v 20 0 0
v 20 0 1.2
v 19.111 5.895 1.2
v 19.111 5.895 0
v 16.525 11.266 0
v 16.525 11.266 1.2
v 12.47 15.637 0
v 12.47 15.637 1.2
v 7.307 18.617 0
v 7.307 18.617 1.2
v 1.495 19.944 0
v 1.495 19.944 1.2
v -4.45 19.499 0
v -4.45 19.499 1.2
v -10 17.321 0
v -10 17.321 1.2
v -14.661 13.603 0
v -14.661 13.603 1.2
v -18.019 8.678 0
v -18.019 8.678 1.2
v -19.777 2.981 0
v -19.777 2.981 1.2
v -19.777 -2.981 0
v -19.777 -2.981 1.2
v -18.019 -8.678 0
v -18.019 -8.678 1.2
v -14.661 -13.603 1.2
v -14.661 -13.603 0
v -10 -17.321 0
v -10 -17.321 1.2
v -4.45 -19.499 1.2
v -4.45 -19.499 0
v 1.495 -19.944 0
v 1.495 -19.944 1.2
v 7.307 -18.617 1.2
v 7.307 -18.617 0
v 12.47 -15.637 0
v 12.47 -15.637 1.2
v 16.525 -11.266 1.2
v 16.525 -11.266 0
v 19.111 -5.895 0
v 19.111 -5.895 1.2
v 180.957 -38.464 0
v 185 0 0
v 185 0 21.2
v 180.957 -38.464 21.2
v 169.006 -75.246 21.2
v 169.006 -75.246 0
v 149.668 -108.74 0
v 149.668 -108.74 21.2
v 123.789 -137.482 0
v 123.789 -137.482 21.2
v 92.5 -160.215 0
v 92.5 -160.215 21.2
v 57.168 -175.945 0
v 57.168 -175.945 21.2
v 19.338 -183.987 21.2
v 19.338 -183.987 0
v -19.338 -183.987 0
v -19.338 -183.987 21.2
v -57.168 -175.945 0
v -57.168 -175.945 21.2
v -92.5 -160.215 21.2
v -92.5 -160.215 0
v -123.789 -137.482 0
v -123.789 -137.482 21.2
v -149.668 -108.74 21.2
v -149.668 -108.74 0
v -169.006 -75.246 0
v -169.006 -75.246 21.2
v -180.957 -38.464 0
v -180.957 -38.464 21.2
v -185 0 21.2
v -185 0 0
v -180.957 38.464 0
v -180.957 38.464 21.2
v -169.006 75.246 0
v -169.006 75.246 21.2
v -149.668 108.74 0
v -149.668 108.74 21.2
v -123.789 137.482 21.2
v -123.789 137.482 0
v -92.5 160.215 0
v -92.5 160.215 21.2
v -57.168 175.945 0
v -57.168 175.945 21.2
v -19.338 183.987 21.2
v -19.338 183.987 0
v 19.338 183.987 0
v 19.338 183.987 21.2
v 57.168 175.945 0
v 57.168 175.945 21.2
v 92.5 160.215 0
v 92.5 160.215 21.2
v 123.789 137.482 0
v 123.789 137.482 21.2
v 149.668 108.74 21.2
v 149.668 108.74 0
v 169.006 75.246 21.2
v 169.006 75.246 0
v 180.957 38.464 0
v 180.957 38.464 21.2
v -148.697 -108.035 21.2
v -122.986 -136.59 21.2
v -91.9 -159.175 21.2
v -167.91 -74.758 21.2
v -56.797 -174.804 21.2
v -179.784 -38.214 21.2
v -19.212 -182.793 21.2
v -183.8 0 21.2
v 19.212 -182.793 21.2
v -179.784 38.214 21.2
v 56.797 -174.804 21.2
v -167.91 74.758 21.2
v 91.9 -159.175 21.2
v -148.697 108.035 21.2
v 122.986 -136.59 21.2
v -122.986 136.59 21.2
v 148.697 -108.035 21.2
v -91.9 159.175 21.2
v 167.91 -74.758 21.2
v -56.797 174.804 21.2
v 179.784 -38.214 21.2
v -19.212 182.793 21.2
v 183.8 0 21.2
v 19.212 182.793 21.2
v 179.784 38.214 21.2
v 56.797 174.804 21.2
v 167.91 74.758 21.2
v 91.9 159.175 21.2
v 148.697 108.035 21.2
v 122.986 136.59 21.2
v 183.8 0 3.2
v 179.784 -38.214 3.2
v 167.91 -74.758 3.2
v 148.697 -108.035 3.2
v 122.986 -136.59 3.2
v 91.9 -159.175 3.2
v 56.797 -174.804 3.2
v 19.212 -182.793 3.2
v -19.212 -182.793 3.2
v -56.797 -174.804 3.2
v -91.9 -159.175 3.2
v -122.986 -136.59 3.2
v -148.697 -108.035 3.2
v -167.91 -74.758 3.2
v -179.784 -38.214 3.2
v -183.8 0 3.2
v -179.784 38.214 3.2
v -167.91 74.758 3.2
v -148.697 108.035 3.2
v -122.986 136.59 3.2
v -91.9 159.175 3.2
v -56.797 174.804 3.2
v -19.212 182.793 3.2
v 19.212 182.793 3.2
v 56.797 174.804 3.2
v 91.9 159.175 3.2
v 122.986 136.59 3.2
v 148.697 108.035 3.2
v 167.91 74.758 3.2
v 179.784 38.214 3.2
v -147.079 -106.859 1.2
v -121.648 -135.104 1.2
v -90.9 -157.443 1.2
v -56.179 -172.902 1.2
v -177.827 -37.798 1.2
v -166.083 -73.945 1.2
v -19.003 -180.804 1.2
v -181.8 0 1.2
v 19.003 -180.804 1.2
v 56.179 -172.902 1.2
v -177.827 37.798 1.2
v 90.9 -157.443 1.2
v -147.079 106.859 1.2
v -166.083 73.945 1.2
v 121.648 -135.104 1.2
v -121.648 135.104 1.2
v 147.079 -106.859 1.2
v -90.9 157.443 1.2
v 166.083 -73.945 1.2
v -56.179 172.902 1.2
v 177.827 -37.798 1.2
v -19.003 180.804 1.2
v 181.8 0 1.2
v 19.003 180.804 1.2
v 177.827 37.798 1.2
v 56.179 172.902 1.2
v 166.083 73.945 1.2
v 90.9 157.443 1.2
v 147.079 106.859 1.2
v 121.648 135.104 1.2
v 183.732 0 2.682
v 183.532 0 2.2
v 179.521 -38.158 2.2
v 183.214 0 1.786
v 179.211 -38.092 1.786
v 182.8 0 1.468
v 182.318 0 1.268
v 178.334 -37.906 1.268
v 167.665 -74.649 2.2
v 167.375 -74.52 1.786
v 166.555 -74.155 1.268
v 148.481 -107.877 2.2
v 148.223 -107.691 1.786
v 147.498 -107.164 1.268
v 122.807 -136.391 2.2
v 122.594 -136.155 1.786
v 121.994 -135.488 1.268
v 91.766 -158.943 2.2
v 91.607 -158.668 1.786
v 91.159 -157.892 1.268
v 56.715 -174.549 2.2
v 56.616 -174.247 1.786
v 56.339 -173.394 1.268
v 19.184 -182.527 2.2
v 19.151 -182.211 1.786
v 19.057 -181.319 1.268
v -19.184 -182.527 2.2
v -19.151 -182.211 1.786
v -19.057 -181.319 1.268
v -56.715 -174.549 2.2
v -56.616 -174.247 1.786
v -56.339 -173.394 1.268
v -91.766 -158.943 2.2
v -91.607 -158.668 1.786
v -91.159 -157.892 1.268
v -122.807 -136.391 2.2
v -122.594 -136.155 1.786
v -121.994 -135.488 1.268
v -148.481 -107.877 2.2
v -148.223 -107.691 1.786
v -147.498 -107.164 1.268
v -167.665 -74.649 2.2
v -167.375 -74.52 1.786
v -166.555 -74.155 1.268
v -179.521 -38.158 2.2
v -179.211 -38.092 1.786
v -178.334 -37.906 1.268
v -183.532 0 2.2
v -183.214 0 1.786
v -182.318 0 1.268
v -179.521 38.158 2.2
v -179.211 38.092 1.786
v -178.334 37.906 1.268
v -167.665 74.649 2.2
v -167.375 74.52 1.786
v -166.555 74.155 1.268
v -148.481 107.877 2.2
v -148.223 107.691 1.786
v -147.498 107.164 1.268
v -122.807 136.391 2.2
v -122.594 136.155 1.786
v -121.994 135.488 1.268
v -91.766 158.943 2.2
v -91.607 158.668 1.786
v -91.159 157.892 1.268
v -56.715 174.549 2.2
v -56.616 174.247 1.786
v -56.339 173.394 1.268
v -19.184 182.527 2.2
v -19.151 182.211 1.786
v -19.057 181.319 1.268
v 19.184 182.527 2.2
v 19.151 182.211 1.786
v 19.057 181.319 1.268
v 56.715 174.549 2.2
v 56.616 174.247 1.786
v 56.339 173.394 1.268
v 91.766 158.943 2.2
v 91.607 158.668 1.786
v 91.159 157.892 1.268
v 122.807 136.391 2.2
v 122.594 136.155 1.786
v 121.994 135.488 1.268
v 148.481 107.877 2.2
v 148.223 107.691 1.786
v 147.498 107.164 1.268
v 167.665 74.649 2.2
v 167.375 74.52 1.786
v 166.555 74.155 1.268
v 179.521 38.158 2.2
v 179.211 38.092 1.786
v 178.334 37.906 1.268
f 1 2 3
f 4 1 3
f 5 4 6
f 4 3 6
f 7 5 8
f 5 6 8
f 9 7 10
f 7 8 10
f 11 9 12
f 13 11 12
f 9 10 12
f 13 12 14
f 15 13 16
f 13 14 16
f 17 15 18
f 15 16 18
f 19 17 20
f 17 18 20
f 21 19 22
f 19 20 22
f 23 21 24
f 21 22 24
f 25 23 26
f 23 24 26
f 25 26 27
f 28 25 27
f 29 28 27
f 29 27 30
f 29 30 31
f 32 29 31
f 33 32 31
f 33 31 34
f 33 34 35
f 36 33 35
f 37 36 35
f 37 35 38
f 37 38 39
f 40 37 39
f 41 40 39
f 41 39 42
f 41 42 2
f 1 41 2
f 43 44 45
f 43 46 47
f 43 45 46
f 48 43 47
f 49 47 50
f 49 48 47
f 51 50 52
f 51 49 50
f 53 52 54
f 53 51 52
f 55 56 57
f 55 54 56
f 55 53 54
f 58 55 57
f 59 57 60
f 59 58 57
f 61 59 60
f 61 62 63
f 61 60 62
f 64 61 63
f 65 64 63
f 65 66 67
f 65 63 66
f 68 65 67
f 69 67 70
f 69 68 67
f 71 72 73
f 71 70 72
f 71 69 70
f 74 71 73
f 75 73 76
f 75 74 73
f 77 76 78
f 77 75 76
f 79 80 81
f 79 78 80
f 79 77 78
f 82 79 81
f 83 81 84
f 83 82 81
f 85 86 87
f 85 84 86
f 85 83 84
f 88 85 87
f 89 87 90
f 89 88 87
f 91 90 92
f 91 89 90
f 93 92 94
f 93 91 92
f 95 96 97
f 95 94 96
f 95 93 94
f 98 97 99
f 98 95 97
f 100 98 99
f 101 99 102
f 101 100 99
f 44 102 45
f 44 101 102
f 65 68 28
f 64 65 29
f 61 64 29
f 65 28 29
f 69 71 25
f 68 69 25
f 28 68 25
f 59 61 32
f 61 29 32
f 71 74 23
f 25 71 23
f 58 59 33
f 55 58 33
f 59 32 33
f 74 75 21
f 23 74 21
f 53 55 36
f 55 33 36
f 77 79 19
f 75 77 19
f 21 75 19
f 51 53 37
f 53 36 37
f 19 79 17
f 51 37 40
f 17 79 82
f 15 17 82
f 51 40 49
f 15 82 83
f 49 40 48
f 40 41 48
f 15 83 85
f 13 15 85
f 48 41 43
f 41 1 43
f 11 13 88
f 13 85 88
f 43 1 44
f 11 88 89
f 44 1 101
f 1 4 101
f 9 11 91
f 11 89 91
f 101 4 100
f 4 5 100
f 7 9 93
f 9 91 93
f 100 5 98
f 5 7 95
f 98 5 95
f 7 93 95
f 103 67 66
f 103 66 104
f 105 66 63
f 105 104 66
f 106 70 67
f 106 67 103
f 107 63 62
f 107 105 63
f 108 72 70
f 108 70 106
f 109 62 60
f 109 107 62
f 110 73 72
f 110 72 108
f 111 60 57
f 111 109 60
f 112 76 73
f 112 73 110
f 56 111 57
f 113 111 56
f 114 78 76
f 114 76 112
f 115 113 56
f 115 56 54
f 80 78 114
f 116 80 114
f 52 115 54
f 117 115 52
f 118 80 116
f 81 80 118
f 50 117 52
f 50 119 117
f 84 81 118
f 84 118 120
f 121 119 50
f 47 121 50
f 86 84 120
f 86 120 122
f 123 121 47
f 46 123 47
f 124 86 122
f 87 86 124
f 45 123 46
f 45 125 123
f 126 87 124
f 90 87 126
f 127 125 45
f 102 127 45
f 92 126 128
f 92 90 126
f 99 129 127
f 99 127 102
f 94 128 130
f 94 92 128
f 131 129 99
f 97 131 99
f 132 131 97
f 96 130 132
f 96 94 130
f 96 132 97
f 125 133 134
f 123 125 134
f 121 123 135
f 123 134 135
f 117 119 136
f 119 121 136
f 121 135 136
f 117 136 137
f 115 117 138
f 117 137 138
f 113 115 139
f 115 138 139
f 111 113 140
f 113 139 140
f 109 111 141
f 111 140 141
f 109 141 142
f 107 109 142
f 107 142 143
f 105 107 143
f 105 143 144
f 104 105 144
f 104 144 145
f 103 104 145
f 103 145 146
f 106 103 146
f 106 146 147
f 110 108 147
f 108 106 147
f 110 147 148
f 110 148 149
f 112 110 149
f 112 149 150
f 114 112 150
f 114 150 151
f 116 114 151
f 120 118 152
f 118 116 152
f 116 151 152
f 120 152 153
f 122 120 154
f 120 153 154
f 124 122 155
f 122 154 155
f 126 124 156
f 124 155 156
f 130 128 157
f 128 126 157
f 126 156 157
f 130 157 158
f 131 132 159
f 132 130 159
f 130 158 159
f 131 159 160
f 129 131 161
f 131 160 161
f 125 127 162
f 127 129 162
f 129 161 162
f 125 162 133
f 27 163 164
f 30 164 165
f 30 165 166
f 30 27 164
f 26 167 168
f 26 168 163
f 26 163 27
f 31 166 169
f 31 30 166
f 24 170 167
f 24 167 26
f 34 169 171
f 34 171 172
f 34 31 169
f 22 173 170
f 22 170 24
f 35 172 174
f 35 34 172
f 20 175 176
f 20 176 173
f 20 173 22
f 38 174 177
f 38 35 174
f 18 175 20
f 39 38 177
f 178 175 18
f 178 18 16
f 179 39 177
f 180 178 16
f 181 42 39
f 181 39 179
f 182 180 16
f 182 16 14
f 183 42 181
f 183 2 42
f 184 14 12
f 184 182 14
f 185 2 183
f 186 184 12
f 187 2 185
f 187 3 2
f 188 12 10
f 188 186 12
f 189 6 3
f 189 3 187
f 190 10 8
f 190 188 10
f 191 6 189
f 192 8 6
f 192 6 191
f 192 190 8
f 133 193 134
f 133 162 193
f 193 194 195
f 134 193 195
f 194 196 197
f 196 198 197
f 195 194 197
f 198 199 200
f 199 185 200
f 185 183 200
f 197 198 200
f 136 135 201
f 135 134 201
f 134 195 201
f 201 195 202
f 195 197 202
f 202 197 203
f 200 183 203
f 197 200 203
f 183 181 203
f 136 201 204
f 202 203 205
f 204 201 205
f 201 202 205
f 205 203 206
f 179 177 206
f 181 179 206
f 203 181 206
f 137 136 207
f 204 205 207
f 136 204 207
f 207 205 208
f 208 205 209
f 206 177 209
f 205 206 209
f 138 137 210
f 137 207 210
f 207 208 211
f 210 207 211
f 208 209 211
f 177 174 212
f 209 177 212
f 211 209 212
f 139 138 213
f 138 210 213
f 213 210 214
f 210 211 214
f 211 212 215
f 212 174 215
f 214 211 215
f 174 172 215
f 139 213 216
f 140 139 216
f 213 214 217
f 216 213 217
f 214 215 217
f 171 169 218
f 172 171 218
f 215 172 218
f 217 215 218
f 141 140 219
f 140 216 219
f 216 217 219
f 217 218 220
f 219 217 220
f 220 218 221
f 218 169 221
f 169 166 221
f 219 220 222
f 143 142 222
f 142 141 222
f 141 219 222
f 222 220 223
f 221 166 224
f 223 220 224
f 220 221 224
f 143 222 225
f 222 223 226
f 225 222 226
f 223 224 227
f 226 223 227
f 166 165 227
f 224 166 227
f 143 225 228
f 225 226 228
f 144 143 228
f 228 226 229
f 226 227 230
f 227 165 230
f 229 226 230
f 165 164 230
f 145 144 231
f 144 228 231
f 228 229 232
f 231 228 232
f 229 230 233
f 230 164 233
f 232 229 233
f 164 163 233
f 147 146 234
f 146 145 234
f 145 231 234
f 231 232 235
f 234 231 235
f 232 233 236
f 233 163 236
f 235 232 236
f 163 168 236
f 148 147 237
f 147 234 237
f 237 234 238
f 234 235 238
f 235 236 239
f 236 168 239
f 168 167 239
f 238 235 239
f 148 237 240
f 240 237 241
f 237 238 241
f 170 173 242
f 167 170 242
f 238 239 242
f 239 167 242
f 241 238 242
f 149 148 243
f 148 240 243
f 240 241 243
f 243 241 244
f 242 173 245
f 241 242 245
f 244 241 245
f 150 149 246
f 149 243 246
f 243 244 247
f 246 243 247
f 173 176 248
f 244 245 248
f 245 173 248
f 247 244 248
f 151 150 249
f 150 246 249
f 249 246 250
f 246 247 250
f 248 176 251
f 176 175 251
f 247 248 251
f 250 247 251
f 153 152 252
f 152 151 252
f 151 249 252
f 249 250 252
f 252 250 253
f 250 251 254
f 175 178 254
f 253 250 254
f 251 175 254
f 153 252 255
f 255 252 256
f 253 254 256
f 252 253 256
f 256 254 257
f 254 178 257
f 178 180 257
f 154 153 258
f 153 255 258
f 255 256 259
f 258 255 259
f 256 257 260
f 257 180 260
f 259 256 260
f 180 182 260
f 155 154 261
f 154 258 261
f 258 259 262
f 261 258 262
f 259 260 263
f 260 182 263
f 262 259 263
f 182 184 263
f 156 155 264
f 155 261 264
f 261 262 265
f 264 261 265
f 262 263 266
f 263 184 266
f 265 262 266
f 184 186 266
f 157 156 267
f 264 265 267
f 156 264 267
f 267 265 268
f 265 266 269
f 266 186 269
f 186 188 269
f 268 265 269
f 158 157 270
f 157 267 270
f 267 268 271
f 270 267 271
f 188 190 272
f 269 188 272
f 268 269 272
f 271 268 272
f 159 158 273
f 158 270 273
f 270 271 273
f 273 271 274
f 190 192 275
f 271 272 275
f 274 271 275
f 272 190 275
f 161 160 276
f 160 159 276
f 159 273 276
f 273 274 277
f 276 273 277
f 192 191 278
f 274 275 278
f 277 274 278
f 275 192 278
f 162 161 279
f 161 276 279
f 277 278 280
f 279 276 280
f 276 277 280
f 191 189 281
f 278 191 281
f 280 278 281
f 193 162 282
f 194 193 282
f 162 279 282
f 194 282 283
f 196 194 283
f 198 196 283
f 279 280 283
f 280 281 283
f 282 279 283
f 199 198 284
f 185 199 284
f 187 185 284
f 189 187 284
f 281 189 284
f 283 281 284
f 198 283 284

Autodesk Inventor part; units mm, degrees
ref_plane "YZ Plane" through (0, 0, 0) normal (1, 0, 0) x (0, 1, 0)
ref_plane "XZ Plane" through (0, 0, 0) normal (0, 1, 0) x (-1, 0, 0)
ref_plane "XY Plane" through (0, 0, 0) normal (0, 0, 1) x (1, 0, 0)
sketch "Boceto1" plane through (0, 0, 0) normal (0, 0, 1) x (1, 0, 0)
  circle A0 centre (0, 0) radius 185
  circle A1 centre (0, 0) radius 183.8
  dimension "d0" = 370
  dimension "d1" = 367.6
extrude "Extrusión1" add sketch "Boceto1" along normal blind 1.2 contours A1
extrude "Extrusión2" add sketch "Boceto1" along normal blind 21.2
fillet "Empalme1" radius 2 1 edges at (-183.8, 0, 1.2)
sketch "Boceto2" plane through (0, 0, 1.2) normal (0, 0, 1) x (1, 0, 0)
  circle A0 centre (0, 0) radius 20
  dimension "d7" = 40
extrude "Extrusión3" cut sketch "Boceto2" against normal blind 10
properties part number "tapa_tambor"
